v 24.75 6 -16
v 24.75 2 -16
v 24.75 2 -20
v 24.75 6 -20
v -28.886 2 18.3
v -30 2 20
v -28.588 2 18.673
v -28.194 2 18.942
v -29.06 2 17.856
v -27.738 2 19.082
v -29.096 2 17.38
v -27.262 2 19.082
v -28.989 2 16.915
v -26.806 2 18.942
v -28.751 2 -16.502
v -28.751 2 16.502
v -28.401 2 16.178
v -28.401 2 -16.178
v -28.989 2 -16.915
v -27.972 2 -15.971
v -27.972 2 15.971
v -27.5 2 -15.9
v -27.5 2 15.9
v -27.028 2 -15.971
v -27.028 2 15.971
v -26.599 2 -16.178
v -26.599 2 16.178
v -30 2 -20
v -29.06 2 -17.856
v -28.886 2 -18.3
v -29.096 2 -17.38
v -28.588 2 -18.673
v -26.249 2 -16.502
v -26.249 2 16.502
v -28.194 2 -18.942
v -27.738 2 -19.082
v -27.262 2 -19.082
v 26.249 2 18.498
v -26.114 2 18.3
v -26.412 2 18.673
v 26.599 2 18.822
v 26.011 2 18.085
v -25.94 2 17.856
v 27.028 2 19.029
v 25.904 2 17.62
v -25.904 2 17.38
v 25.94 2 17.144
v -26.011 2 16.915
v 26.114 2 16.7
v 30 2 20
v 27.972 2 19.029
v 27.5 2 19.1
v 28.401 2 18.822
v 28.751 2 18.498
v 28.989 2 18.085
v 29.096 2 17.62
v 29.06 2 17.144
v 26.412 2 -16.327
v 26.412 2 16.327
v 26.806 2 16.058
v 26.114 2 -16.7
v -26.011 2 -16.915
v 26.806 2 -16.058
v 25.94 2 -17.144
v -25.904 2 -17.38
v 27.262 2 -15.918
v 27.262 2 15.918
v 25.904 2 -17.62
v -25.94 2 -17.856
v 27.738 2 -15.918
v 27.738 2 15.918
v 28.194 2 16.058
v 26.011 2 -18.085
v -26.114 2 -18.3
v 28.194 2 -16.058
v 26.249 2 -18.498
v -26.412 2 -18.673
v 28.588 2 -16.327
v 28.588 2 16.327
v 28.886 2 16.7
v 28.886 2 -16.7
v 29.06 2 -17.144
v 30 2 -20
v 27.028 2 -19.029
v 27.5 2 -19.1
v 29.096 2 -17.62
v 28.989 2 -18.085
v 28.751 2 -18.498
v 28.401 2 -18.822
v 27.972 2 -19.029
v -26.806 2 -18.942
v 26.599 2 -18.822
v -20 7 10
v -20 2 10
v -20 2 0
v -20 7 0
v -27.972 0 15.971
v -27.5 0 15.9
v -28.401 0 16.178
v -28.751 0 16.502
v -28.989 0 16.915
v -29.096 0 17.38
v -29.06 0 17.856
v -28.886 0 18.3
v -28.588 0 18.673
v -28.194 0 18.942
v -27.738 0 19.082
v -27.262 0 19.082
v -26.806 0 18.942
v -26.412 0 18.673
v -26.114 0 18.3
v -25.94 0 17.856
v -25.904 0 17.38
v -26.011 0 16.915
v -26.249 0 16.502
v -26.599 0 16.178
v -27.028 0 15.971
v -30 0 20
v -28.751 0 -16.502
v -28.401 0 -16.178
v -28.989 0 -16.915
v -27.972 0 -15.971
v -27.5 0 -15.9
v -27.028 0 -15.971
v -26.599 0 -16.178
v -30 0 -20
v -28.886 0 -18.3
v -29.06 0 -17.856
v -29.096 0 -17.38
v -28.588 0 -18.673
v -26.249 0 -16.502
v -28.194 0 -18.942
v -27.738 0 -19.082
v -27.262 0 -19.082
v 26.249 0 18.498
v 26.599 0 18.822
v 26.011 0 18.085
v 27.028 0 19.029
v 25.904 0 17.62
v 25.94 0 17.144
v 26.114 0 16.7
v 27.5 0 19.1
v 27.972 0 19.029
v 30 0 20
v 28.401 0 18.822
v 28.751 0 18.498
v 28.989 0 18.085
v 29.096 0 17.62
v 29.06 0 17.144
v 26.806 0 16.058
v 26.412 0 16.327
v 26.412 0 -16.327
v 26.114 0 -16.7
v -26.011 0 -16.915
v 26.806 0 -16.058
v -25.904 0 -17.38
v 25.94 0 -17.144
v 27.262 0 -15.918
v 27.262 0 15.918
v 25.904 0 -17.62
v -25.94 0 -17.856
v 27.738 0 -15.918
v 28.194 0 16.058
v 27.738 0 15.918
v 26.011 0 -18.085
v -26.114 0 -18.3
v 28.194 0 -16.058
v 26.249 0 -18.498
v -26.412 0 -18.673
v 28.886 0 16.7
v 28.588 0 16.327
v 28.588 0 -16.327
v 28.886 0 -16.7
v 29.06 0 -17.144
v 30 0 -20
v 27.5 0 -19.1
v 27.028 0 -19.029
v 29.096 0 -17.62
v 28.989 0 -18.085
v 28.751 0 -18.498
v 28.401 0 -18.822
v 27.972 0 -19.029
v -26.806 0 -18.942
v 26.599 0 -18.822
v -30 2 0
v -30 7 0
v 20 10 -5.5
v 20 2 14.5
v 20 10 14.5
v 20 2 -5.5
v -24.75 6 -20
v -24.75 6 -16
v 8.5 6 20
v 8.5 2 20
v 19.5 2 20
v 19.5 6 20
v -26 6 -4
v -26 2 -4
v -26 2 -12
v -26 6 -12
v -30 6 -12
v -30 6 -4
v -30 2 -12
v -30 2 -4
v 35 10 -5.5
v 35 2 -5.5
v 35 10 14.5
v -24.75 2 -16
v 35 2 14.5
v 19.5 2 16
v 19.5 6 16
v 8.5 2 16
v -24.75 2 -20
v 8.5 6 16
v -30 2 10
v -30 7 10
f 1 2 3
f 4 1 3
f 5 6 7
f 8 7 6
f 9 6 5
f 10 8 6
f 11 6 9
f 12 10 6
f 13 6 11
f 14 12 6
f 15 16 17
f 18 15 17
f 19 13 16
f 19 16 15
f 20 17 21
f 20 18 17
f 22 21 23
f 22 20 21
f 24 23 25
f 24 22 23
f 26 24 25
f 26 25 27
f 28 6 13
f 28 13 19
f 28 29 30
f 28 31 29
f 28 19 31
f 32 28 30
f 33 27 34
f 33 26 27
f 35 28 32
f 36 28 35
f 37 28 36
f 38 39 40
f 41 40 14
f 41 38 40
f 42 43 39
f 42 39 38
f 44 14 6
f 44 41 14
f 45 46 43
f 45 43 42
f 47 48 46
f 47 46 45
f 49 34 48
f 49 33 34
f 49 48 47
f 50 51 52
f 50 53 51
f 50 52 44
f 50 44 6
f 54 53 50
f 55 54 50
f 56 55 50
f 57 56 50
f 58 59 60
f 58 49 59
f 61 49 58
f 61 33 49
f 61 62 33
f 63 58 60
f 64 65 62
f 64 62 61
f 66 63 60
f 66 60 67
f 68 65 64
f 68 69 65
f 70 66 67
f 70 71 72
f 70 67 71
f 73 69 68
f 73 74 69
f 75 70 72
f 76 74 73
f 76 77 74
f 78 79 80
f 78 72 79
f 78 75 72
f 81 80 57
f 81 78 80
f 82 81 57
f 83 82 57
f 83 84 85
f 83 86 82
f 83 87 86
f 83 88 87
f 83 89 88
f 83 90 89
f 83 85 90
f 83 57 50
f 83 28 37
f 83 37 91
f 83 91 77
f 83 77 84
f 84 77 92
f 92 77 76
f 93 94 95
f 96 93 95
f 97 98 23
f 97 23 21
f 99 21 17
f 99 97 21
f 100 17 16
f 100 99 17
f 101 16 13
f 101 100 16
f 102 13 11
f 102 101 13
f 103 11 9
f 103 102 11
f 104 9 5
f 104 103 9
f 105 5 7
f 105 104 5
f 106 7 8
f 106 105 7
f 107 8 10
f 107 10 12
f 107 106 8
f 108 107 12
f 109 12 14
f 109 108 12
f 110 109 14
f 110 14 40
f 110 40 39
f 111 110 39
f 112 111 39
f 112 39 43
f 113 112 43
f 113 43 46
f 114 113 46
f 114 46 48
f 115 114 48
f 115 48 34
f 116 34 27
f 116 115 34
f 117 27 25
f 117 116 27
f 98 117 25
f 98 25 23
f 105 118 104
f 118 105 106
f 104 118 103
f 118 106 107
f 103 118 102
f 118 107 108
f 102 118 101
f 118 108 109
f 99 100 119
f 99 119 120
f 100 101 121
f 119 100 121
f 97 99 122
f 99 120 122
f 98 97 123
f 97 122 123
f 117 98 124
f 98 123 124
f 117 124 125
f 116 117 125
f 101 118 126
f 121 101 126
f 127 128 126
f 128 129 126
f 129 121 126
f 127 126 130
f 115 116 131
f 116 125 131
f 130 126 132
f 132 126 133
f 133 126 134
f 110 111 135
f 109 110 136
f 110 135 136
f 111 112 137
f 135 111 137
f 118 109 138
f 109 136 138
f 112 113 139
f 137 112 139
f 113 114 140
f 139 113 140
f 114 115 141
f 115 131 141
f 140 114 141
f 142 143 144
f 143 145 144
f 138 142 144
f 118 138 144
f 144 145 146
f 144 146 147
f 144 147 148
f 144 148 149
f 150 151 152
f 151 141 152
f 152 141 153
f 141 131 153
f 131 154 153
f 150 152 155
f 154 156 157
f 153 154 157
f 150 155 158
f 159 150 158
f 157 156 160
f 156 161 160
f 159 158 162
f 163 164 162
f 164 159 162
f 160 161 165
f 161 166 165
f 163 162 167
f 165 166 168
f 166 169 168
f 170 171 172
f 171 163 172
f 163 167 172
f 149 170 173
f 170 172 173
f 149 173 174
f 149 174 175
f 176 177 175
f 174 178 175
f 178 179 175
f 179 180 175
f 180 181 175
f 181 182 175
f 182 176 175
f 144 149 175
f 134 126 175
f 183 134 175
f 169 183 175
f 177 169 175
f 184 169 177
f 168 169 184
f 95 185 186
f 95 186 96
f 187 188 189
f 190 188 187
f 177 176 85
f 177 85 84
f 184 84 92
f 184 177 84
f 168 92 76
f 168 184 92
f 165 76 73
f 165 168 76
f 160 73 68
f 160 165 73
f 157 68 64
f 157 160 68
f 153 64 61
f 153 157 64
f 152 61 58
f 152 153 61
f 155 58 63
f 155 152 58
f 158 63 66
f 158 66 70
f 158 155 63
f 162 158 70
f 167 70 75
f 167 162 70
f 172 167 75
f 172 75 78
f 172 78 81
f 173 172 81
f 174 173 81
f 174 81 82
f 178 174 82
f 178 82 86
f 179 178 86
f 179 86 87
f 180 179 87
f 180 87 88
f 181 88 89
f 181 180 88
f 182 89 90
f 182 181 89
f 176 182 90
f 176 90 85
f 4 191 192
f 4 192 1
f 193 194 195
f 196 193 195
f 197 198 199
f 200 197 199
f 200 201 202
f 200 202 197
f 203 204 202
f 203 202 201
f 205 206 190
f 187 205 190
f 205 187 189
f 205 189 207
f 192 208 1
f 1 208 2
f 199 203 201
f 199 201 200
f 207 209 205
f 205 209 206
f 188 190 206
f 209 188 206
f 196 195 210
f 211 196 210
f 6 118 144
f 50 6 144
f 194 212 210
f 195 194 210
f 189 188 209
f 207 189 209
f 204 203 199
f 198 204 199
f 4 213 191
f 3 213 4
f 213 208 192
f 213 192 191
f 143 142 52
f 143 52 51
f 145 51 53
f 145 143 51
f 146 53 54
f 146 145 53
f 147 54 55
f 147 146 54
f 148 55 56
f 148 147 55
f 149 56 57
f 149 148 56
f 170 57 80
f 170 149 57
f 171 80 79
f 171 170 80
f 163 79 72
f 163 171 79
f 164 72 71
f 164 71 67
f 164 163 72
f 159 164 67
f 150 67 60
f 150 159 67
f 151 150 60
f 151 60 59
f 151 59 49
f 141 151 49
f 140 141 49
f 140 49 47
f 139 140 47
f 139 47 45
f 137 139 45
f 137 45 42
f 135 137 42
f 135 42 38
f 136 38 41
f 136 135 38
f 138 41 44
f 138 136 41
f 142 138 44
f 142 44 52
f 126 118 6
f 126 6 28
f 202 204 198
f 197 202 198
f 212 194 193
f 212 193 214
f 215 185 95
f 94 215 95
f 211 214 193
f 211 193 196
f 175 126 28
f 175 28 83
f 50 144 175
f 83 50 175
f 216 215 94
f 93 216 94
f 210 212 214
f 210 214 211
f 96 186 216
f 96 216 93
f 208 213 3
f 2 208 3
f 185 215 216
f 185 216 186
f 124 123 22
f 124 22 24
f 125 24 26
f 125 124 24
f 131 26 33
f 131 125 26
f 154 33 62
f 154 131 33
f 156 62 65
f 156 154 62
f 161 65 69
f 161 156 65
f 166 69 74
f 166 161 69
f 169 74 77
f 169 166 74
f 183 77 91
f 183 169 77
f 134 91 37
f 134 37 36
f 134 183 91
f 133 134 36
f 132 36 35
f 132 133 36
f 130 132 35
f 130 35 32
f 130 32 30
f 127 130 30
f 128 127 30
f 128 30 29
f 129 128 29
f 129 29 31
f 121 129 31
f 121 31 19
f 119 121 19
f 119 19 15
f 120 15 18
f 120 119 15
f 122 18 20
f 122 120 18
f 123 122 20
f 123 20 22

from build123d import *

# Parameters (mm, degrees)
SKETCH_1_W        = 60
SKETCH_1_H        = 40
SKETCH_1_R        = 1.6
EXTRUDE_1_DEPTH   = 2
SKETCH_2_W        = 49.5
SKETCH_2_H        = 4
EXTRUDE_2_DEPTH   = 4
SKETCH_2_W_2      = 4
SKETCH_2_H_2      = 8
EXTRUDE_2_2_DEPTH = 4
SKETCH_2_W_3      = 11
EXTRUDE_2_3_DEPTH = 4
SKETCH_2_3_W      = 10
SKETCH_2_3_H      = 10
EXTRUDE_3_DEPTH   = 5
SKETCH_2_4_W      = 15
SKETCH_2_4_H      = 20
EXTRUDE_4_DEPTH   = 8


with BuildPart() as part:
    # 草图1 → 凸台-拉伸1 (new body)
    with BuildSketch(Plane(origin=(0, 0, 0), x_dir=(1, 0, 0), z_dir=(0, 1, 0))):
        Rectangle(SKETCH_1_W, SKETCH_1_H)
        with Locations((-27.5, 17.5)):
            Circle(SKETCH_1_R, mode=Mode.SUBTRACT)
        with Locations((27.5, 17.5)):
            Circle(SKETCH_1_R, mode=Mode.SUBTRACT)
        with Locations((27.5, -17.5)):
            Circle(SKETCH_1_R, mode=Mode.SUBTRACT)
        with Locations((-27.5, -17.5)):
            Circle(SKETCH_1_R, mode=Mode.SUBTRACT)
    extrude(amount=EXTRUDE_1_DEPTH)


with BuildPart() as body_2:
    # 草图2 → 凸台-拉伸2 (new body)
    with BuildSketch(Plane(origin=(0, 2, 0), x_dir=(1, 0, 0), z_dir=(0, 1, 0))):
        with Locations((0, 18)):
            Rectangle(SKETCH_2_W, SKETCH_2_H)
    extrude(amount=EXTRUDE_2_DEPTH)


with BuildPart() as body_3:
    # 草图2 → Extrude 2 2 (new body)
    with BuildSketch(Plane(origin=(0, 2, 0), x_dir=(1, 0, 0), z_dir=(0, 1, 0))):
        with Locations((-28, 8)):
            Rectangle(SKETCH_2_W_2, SKETCH_2_H_2)
    extrude(amount=EXTRUDE_2_2_DEPTH)


with BuildPart() as body_4:
    # 草图2 → Extrude 2 3 (new body)
    with BuildSketch(Plane(origin=(0, 2, 0), x_dir=(1, 0, 0), z_dir=(0, 1, 0))):
        with Locations((14, -18)):
            Rectangle(SKETCH_2_W_3, SKETCH_2_H)
    extrude(amount=EXTRUDE_2_3_DEPTH)


with BuildPart() as body_5:
    # 草图2<3> → 凸台-拉伸3 (new body)
    with BuildSketch(Plane(origin=(0, 2, 0), x_dir=(1, 0, 0), z_dir=(0, 1, 0))):
        with Locations((-25, -5)):
            Rectangle(SKETCH_2_3_W, SKETCH_2_3_H)
    extrude(amount=EXTRUDE_3_DEPTH)


with BuildPart() as body_6:
    # 草图2<4> → 凸台-拉伸4 (new body)
    with BuildSketch(Plane(origin=(0, 2, 0), x_dir=(1, 0, 0), z_dir=(0, 1, 0))):
        with Locations((27.5, -4.5)):
            Rectangle(SKETCH_2_4_W, SKETCH_2_4_H)
    extrude(amount=EXTRUDE_4_DEPTH)


solid = Compound([part.part, body_2.part, body_3.part, body_4.part, body_5.part, body_6.part])
